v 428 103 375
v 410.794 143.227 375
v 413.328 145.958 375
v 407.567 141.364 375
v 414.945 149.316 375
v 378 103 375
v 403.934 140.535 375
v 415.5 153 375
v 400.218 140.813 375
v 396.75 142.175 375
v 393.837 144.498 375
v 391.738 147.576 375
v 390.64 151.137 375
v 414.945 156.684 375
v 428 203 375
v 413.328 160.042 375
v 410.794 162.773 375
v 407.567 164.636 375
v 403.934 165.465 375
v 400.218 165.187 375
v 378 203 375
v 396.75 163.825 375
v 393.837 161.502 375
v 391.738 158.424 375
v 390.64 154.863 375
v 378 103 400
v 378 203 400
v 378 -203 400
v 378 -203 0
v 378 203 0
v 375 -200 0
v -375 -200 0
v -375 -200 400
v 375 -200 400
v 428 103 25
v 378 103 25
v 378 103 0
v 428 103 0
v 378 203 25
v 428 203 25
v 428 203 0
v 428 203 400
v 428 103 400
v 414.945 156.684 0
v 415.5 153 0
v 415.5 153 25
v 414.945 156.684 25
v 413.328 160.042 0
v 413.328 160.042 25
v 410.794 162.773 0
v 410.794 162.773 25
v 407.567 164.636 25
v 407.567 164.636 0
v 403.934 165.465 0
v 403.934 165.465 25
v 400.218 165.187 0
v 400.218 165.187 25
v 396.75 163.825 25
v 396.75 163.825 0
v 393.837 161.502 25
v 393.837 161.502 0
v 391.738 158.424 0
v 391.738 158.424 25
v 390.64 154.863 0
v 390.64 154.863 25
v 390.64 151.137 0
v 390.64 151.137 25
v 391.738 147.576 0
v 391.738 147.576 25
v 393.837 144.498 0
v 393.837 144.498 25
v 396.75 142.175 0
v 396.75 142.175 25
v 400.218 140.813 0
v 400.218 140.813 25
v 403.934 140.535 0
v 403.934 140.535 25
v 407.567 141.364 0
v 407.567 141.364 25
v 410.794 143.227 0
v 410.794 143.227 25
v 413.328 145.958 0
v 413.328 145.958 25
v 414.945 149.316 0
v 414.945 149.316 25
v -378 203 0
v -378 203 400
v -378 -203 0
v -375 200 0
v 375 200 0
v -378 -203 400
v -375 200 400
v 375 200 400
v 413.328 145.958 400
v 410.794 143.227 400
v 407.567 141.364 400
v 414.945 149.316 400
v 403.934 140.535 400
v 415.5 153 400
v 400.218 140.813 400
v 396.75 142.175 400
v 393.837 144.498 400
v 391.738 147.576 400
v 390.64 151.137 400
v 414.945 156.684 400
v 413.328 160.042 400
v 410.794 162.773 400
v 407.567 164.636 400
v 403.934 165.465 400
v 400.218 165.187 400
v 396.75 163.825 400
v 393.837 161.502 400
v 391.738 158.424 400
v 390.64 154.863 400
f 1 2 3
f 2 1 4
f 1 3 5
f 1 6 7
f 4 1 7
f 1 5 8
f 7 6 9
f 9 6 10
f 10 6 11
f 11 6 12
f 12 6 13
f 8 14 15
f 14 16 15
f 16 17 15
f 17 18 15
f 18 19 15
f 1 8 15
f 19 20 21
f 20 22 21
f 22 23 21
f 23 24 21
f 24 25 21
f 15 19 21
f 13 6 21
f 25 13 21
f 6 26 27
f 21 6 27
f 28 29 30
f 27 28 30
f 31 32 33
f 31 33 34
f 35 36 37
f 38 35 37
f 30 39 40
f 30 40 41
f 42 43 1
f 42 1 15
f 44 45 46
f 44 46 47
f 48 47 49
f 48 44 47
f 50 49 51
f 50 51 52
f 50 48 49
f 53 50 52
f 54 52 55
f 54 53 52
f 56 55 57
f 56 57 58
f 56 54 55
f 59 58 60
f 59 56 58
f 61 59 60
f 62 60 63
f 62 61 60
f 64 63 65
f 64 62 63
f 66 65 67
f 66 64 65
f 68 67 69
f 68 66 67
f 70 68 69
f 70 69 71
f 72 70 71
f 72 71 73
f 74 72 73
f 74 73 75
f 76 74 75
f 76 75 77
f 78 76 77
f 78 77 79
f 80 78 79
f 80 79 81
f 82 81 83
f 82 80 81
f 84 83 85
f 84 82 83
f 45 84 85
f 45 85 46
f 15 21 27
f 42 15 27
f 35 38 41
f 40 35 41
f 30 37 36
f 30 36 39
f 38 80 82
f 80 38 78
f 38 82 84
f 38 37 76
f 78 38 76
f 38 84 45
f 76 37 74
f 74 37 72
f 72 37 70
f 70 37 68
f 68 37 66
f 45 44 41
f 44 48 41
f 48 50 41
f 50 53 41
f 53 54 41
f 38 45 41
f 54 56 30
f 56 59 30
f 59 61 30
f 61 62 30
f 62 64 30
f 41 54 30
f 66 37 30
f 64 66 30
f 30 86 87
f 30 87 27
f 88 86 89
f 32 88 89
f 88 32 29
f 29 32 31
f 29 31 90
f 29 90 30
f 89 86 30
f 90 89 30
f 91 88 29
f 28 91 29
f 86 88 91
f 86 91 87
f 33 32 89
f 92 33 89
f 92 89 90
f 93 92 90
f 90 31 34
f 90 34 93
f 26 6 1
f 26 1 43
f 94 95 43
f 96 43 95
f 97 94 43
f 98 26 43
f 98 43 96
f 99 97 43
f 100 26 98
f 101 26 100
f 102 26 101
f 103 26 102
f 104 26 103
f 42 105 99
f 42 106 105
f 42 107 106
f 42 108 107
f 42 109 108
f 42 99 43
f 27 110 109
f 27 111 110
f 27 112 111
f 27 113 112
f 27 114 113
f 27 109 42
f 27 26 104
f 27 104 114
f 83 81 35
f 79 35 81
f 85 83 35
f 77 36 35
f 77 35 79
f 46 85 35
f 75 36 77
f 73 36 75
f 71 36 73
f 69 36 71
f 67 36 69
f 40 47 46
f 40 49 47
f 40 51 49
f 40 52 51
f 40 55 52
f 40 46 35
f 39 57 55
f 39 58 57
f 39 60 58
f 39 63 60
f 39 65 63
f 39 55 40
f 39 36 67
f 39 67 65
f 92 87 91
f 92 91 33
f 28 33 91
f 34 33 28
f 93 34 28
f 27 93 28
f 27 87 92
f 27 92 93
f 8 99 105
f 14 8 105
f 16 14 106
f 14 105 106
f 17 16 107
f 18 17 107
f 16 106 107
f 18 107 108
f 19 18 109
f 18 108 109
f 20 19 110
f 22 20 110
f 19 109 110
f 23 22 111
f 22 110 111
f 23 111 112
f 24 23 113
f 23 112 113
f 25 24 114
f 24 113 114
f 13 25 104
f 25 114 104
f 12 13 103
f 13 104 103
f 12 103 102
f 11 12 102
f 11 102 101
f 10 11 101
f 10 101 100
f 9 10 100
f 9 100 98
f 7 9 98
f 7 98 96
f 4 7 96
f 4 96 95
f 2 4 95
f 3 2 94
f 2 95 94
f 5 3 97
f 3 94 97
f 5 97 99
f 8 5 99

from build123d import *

# Parameters (mm, degrees)
F0_W     = 756
F0_H     = 406
F0_W_2   = 750
F0_H_2   = 400
F1_DEPTH = 400
F2_W     = 100
F2_H     = 25
F3_DEPTH = 50
F4_R     = 12.5
F5_DEPTH = 25


with BuildPart() as f1:
    # F0 (on Top) → F1 (new body)
    with BuildSketch(Plane.XY):
        Rectangle(F0_W, F0_H)
        Rectangle(F0_W_2, F0_H_2, mode=Mode.SUBTRACT)
    extrude(amount=F1_DEPTH)


with BuildPart() as f3:
    # F2 (on face) → F3 (new body)
    with BuildSketch(Plane.YZ.offset(378)):
        with Locations((153, 387.5)):
            Rectangle(F2_W, F2_H)
    extrude(amount=F3_DEPTH)

    # F4 (on face) → F5 (cut)
    with BuildSketch(Plane.XY.offset(400)):
        with Locations((403, 153)):
            Circle(F4_R)
    extrude(amount=-F5_DEPTH, mode=Mode.SUBTRACT)


with BuildPart() as f7_1:
    # F7: instance of F3
    add(f3.part.mirror(Plane.XY.offset(200)))


solid = Compound([f1.part, f3.part, f7_1.part])
